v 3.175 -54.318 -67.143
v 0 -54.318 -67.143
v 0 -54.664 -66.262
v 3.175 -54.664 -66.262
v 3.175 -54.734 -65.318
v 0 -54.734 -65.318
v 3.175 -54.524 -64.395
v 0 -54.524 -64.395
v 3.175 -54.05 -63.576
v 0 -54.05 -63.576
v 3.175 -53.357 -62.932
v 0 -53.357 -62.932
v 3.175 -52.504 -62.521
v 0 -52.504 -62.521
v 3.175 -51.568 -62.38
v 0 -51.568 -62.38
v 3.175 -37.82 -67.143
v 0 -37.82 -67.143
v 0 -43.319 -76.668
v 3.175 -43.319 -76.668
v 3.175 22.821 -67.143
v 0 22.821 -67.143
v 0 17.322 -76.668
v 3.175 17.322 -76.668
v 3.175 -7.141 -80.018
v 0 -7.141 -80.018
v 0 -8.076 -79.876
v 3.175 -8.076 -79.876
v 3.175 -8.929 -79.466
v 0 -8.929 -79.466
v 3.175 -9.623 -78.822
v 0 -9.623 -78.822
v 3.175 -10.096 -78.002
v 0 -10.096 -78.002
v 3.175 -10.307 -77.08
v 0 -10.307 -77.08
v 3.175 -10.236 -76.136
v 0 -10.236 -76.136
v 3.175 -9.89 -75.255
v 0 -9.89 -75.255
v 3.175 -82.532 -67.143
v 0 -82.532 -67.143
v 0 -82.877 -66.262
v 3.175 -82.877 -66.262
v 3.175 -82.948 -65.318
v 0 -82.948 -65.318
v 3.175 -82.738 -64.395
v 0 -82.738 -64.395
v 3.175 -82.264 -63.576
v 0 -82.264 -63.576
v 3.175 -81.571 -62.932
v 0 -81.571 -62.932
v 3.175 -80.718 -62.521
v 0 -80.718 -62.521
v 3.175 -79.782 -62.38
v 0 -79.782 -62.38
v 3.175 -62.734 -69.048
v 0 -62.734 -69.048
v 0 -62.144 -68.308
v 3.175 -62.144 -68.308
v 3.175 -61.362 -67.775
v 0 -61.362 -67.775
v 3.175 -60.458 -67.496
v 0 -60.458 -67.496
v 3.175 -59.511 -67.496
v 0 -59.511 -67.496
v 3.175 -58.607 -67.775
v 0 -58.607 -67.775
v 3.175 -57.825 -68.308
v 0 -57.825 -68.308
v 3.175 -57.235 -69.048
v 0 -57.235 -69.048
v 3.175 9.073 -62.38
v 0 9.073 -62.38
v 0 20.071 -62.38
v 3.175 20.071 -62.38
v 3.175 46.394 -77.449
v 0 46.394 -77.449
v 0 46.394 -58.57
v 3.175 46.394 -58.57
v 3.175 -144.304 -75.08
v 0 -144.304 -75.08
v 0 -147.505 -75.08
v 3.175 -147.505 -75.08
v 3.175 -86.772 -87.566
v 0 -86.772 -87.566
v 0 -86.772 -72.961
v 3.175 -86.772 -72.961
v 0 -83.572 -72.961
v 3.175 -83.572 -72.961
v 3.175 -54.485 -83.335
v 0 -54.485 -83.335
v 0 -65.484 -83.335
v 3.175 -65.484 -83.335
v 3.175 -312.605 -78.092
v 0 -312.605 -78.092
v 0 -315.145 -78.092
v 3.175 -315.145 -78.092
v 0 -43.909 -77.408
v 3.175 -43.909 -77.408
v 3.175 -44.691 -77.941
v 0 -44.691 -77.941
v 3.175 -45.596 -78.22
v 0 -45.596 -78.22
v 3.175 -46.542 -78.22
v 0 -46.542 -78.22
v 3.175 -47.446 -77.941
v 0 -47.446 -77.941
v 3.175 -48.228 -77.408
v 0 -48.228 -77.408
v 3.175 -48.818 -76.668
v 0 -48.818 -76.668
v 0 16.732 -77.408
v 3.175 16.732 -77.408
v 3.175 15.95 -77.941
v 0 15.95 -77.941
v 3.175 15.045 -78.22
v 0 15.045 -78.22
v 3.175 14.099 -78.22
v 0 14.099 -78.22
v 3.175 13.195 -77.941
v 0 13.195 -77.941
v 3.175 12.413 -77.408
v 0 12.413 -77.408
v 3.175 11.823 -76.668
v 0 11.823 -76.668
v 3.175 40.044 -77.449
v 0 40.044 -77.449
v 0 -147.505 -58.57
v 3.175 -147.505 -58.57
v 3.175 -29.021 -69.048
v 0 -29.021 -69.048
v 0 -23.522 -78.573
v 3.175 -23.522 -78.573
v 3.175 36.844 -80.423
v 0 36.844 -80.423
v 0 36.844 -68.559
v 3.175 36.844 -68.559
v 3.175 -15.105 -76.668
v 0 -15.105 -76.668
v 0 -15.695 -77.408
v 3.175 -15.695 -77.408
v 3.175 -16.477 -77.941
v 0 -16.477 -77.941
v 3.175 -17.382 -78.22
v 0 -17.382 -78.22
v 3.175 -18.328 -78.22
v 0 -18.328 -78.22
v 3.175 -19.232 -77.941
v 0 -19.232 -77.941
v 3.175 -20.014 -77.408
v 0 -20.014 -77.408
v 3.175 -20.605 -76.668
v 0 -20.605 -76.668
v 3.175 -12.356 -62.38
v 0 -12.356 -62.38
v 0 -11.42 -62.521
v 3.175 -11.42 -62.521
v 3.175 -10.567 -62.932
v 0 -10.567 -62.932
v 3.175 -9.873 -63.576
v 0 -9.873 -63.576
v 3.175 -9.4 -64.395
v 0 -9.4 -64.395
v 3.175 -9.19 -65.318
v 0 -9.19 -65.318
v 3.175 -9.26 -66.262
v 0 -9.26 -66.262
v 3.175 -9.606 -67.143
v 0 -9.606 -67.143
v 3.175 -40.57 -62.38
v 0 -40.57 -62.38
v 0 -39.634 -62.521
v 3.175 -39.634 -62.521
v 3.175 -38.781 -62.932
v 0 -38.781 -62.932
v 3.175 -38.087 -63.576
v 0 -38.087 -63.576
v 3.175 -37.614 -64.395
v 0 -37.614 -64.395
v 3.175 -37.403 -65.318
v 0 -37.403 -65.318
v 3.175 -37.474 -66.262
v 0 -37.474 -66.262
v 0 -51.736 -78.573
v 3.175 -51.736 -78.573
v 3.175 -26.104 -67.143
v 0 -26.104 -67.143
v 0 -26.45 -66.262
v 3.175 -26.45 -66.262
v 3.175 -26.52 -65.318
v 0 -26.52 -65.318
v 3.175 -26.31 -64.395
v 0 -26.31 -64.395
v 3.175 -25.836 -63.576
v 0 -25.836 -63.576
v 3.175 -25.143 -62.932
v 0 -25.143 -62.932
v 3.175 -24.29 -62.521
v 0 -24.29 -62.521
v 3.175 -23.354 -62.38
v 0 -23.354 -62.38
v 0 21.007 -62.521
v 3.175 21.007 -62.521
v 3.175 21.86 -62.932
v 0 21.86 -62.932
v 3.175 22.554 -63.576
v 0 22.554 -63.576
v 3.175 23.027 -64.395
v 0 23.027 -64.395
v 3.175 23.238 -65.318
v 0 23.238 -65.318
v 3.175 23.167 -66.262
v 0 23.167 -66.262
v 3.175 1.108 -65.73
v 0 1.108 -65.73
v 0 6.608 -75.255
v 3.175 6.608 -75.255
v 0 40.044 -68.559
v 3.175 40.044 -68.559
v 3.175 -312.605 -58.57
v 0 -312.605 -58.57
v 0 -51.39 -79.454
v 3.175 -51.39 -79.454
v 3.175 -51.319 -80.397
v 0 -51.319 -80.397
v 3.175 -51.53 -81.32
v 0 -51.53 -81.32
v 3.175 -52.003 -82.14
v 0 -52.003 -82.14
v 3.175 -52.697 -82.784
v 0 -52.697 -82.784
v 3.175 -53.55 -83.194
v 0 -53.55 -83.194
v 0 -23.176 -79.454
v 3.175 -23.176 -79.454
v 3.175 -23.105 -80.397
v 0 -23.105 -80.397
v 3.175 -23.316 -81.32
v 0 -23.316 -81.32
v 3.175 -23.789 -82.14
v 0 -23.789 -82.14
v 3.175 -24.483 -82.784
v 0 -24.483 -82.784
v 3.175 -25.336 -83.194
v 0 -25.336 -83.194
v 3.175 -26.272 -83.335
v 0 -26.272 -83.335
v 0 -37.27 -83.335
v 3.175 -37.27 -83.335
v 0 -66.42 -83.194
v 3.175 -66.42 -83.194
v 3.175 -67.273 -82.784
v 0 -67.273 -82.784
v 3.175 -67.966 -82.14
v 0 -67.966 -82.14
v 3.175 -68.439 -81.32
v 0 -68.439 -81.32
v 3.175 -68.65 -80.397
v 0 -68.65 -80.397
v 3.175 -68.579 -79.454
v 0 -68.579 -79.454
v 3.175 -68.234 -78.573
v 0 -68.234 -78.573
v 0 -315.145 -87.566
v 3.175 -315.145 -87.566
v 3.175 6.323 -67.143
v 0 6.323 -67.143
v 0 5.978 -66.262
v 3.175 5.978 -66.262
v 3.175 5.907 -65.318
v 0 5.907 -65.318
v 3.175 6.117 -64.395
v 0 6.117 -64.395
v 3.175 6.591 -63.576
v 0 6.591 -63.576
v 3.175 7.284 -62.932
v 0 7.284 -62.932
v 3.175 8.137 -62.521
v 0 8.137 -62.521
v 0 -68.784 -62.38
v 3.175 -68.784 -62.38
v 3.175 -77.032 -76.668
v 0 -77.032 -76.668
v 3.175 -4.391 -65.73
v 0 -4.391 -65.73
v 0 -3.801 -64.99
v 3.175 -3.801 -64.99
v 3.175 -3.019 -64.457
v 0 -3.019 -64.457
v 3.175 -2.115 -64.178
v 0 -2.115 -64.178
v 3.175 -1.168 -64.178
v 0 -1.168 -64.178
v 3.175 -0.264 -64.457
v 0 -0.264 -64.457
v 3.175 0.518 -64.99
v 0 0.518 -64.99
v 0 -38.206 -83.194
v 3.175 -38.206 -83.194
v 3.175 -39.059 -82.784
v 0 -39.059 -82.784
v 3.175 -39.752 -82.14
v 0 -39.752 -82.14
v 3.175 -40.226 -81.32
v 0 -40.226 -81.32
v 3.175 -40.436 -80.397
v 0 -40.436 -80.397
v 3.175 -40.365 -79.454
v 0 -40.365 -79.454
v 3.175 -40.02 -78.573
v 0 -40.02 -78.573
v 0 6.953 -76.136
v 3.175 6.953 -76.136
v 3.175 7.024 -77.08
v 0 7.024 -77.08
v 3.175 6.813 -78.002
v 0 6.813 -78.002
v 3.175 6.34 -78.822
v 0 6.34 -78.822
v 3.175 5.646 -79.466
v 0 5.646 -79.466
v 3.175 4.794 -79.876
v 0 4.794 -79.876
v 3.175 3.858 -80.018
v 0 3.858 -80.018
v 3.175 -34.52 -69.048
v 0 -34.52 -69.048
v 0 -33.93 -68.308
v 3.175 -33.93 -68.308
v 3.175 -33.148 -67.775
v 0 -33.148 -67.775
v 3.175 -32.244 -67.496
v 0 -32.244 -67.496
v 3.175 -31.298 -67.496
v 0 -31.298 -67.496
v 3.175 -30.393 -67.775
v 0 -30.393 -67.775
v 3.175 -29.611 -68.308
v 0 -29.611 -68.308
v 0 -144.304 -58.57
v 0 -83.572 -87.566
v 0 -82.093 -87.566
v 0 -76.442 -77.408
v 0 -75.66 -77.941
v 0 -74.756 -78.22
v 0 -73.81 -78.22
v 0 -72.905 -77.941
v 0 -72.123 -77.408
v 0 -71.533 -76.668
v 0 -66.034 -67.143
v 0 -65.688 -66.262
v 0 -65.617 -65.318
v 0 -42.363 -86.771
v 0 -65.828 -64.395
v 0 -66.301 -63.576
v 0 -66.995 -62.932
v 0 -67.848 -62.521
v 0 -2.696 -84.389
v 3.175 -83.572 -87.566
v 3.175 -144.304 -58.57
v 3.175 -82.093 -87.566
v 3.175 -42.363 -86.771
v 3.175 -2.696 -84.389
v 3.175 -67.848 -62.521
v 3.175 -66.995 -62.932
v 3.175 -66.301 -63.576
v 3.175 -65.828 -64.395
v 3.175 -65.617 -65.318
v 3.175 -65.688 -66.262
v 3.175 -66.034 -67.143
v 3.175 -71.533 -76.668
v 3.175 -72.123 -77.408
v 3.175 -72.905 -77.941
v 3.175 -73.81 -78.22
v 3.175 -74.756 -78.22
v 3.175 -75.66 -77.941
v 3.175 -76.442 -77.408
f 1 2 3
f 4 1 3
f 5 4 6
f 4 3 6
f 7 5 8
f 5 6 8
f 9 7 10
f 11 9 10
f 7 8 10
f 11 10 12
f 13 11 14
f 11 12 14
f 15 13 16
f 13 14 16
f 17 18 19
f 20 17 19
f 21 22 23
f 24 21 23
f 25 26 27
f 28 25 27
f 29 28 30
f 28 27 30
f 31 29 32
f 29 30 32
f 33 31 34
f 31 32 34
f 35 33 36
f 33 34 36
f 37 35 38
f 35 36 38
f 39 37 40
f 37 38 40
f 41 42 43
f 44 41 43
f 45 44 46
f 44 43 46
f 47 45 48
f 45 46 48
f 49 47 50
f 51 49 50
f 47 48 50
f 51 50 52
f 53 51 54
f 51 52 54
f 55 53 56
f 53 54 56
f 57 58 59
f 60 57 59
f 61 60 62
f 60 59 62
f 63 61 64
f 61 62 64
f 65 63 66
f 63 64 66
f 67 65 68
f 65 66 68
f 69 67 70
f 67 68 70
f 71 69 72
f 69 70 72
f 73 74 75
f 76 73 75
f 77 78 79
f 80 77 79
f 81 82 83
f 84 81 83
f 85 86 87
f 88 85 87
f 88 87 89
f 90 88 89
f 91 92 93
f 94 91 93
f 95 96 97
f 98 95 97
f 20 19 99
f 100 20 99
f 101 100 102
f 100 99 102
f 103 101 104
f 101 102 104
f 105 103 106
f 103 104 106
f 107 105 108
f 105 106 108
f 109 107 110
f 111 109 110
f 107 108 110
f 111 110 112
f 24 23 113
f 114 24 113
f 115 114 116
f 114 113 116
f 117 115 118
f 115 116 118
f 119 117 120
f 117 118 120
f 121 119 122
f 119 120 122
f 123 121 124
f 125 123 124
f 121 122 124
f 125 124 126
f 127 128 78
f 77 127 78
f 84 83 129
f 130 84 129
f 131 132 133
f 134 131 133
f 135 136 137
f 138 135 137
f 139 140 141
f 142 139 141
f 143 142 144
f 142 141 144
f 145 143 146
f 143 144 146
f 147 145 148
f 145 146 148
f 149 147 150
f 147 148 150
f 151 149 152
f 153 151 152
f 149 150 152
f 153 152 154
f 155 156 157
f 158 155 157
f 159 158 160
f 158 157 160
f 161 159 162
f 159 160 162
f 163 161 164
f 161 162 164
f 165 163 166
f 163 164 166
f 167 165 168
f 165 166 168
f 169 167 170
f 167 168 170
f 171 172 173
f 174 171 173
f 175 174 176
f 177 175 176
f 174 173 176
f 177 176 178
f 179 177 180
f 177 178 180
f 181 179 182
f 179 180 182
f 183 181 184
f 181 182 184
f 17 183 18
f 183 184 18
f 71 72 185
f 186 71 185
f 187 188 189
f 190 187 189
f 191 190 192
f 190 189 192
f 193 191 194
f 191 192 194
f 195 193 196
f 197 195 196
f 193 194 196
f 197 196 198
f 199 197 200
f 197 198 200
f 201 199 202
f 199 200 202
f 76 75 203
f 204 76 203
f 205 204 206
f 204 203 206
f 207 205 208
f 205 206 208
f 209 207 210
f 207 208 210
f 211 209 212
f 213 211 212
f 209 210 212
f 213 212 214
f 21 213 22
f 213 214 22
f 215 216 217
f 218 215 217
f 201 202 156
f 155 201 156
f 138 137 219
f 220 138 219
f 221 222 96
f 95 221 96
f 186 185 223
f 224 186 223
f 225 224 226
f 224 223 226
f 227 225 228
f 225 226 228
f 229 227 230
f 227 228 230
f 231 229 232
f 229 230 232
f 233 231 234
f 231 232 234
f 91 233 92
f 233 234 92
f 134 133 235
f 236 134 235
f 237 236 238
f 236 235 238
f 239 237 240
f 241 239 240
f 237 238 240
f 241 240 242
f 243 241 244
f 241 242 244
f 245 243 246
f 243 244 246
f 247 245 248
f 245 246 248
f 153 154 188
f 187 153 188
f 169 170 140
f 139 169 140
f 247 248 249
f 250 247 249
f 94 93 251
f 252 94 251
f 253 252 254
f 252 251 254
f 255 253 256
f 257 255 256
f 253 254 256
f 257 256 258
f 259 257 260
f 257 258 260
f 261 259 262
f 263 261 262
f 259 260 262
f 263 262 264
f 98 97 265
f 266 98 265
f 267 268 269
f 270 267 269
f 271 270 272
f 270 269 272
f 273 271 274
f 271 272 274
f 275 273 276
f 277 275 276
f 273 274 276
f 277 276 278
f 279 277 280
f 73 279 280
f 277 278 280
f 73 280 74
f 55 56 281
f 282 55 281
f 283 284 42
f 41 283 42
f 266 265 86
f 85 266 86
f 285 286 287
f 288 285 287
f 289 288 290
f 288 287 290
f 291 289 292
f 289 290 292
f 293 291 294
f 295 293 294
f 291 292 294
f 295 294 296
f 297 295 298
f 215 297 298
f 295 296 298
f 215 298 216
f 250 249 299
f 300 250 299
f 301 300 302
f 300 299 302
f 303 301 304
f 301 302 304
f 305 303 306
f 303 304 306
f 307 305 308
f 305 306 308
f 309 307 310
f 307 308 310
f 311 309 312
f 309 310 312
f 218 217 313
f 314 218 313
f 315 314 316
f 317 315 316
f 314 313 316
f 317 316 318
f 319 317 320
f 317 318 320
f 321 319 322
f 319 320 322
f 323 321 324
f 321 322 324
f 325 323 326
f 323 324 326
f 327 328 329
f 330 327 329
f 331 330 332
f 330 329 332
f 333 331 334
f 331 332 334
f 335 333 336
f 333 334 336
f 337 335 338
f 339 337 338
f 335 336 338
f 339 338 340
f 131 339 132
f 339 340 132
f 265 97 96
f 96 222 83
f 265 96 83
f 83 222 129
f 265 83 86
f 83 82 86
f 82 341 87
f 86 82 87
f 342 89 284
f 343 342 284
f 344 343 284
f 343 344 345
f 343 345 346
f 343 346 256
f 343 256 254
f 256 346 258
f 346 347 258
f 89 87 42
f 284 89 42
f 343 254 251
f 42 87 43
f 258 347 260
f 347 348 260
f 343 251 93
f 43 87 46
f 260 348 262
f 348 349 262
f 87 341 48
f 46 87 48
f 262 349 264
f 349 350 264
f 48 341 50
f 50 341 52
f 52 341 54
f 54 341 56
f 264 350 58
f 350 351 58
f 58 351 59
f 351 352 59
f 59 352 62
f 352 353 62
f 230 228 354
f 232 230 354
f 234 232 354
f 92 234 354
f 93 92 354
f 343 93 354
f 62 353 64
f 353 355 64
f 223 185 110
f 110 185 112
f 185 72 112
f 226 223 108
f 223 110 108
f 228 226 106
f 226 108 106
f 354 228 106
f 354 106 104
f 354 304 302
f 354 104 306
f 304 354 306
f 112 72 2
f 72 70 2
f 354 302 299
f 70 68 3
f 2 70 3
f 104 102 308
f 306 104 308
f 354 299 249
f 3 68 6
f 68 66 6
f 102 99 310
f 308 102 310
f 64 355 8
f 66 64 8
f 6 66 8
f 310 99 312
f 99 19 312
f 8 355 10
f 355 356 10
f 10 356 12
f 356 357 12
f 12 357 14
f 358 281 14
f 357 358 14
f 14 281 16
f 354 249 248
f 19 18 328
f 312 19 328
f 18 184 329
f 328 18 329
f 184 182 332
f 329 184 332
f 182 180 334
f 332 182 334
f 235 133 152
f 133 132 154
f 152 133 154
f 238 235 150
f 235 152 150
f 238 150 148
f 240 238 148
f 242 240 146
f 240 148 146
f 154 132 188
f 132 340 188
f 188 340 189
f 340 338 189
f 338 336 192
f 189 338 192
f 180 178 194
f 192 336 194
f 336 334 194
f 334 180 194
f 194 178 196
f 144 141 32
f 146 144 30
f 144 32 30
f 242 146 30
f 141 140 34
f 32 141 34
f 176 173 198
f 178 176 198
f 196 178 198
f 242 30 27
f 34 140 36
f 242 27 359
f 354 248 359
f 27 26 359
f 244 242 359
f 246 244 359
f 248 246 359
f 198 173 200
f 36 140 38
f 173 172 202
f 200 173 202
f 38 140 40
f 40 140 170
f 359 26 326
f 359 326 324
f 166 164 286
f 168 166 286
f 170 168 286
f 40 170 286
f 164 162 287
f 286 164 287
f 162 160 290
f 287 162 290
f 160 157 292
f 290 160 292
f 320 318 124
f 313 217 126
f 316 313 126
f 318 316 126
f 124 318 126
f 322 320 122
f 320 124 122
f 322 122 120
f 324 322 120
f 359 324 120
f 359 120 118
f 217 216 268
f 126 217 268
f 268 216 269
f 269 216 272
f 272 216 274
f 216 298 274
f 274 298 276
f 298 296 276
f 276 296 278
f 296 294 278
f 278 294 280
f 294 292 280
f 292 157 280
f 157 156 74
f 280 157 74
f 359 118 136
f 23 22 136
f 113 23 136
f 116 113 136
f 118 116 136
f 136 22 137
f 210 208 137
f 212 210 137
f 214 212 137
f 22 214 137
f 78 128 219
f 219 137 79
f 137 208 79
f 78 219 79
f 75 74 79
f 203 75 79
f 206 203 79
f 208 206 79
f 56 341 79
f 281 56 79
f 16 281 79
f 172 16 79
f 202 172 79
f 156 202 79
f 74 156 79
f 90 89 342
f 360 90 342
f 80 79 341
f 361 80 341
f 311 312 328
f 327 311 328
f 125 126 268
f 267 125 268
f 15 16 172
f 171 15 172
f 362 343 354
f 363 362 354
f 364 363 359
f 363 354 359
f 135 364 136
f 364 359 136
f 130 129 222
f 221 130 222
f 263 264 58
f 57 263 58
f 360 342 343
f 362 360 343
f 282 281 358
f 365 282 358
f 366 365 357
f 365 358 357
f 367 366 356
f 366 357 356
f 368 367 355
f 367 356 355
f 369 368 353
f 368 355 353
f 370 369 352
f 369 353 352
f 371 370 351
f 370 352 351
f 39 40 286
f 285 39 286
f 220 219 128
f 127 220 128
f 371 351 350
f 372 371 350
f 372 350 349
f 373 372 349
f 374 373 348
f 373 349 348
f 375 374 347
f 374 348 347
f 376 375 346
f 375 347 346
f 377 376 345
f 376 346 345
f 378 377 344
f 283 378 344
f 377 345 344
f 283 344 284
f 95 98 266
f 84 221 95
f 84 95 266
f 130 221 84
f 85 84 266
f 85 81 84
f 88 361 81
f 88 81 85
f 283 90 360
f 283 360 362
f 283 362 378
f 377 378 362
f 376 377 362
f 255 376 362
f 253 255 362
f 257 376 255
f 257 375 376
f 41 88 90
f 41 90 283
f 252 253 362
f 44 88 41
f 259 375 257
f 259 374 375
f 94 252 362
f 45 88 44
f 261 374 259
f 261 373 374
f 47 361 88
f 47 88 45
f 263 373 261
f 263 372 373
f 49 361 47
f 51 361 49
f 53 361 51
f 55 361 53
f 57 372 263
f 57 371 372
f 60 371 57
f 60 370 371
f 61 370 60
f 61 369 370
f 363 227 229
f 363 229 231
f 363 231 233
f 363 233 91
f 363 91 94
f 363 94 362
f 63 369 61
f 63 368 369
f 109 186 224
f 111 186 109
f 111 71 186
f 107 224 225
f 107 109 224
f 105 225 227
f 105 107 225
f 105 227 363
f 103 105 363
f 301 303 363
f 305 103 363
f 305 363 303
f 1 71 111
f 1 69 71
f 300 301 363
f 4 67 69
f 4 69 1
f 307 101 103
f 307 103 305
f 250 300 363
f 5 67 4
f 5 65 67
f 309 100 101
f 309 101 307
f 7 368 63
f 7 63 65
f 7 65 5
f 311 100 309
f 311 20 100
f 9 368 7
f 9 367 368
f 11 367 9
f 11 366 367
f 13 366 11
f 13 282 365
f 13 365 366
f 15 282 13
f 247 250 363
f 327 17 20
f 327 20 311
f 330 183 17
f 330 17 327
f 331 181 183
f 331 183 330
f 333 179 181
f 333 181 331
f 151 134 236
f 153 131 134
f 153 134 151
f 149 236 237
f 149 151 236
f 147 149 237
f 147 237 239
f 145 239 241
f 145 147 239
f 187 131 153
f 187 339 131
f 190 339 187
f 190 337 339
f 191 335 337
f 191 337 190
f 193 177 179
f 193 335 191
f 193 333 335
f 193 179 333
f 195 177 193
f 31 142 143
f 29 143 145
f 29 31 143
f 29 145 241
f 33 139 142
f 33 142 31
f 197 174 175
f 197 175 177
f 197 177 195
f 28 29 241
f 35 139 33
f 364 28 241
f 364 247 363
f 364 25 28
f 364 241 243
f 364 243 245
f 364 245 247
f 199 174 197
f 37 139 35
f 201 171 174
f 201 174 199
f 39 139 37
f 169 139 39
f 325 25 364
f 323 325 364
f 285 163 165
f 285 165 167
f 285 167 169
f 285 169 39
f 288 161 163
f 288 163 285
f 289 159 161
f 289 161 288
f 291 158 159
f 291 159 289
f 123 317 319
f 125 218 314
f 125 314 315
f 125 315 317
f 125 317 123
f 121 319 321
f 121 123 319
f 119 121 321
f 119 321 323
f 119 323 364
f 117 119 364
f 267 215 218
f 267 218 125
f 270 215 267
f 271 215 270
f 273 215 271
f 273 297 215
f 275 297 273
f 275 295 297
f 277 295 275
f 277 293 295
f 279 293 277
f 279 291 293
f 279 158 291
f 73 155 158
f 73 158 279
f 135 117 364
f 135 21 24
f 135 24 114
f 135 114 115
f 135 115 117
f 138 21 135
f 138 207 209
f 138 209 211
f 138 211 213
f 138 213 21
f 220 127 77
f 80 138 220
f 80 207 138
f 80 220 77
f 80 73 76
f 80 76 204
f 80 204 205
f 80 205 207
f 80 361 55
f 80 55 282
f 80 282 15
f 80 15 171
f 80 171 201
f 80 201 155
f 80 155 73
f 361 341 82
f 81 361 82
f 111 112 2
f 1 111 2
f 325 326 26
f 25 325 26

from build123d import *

# Parameters (mm, degrees)
F1_DEPTH = 3.175


with BuildPart() as f1:
    # F0 (on Right) → F1 (new body)
    with BuildSketch(Plane.YZ):
        with BuildLine():
            Line((46.394076, -58.570202), (-144.304461, -58.570202))
            Line((-144.304461, -58.570202), (-144.304461, -75.080202))
            Line((-144.304461, -75.080202), (-147.504861, -75.080202))
            Line((-147.504861, -75.080202), (-147.504861, -58.570202))
            Line((-147.504861, -58.570202), (-312.604861, -58.570202))
            Line((-312.604861, -58.570202), (-312.604861, -78.091796))
            Line((-312.604861, -78.091796), (-315.144861, -78.091796))
            Line((-315.144861, -78.091796), (-315.144861, -87.565996))
            Line((-315.144861, -87.565996), (-86.772296, -87.565996))
            Line((-86.772296, -87.565996), (-86.772296, -72.960996))
            Line((-86.772296, -72.960996), (-83.571896, -72.960996))
            Line((-83.571896, -72.960996), (-83.571896, -87.565996))
            Line((-83.571896, -87.565996), (-82.093418, -87.565996))
            ThreePointArc((-82.093418, -87.565996), (-22.517711, -85.778555), (36.843676, -80.422662))
            Line((36.843676, -80.422662), (36.843676, -68.559073))
            Line((36.843676, -68.559073), (40.044076, -68.559073))
            Line((40.044076, -68.559073), (40.044076, -77.449073))
            Line((40.044076, -77.449073), (46.394076, -77.449073))
            Line((46.394076, -77.449073), (46.394076, -58.570202))
        make_face()
        with BuildLine():
            Line((-54.485447, -83.335202), (-65.48397, -83.335202))
            ThreePointArc((-65.48397, -83.335202), (-68.233601, -81.747702), (-68.233601, -78.572702))
            Line((-68.233601, -78.572702), (-62.734339, -69.047702))
            ThreePointArc((-62.734339, -69.047702), (-59.984709, -67.460202), (-57.235078, -69.047702))
            Line((-57.235078, -69.047702), (-51.735817, -78.572702))
            ThreePointArc((-51.735817, -78.572702), (-51.735817, -81.747702), (-54.485447, -83.335202))
        make_face(mode=Mode.SUBTRACT)
        with BuildLine():
            Line((-40.019661, -78.572702), (-34.520399, -69.047702))
            ThreePointArc((-34.520399, -69.047702), (-31.770769, -67.460202), (-29.021138, -69.047702))
            Line((-29.021138, -69.047702), (-23.521877, -78.572702))
            ThreePointArc((-23.521877, -78.572702), (-23.521877, -81.747702), (-26.271507, -83.335202))
            Line((-26.271507, -83.335202), (-37.27003, -83.335202))
            ThreePointArc((-37.27003, -83.335202), (-40.019661, -81.747702), (-40.019661, -78.572702))
        make_face(mode=Mode.SUBTRACT)
        with BuildLine():
            ThreePointArc((-68.783527, -62.380202), (-66.033896, -63.967702), (-66.033896, -67.142702))
            Line((-66.033896, -67.142702), (-71.533157, -76.667702))
            ThreePointArc((-71.533157, -76.667702), (-74.282788, -78.255202), (-77.032419, -76.667702))
            Line((-77.032419, -76.667702), (-82.53168, -67.142702))
            ThreePointArc((-82.53168, -67.142702), (-82.53168, -63.967702), (-79.782049, -62.380202))
            Line((-79.782049, -62.380202), (-68.783527, -62.380202))
        make_face(mode=Mode.SUBTRACT)
        with BuildLine():
            ThreePointArc((-54.31774, -67.142702), (-54.31774, -63.967702), (-51.568109, -62.380202))
            Line((-51.568109, -62.380202), (-40.569587, -62.380202))
            ThreePointArc((-40.569587, -62.380202), (-37.819956, -63.967702), (-37.819956, -67.142702))
            Line((-37.819956, -67.142702), (-43.319217, -76.667702))
            ThreePointArc((-43.319217, -76.667702), (-46.068848, -78.255202), (-48.818479, -76.667702))
            Line((-48.818479, -76.667702), (-54.31774, -67.142702))
        make_face(mode=Mode.SUBTRACT)
        with BuildLine():
            ThreePointArc((6.607539, -75.255), (6.607539, -78.43), (3.857909, -80.0175))
            Line((3.857909, -80.0175), (-7.140614, -80.0175))
            ThreePointArc((-7.140614, -80.0175), (-9.890245, -78.43), (-9.890245, -75.255))
            Line((-9.890245, -75.255), (-4.390983, -65.73))
            ThreePointArc((-4.390983, -65.73), (-1.641353, -64.1425), (1.108278, -65.73))
            Line((1.108278, -65.73), (6.607539, -75.255))
        make_face(mode=Mode.SUBTRACT)
        with BuildLine():
            ThreePointArc((-26.1038, -67.142702), (-26.1038, -63.967702), (-23.354169, -62.380202))
            Line((-23.354169, -62.380202), (-12.355647, -62.380202))
            ThreePointArc((-12.355647, -62.380202), (-9.606016, -63.967702), (-9.606016, -67.142702))
            Line((-9.606016, -67.142702), (-15.105277, -76.667702))
            ThreePointArc((-15.105277, -76.667702), (-17.854908, -78.255202), (-20.604539, -76.667702))
            Line((-20.604539, -76.667702), (-26.1038, -67.142702))
        make_face(mode=Mode.SUBTRACT)
        with BuildLine():
            ThreePointArc((6.323311, -67.142702), (6.323311, -63.967702), (9.072942, -62.380202))
            Line((9.072942, -62.380202), (20.071464, -62.380202))
            ThreePointArc((20.071464, -62.380202), (22.821095, -63.967702), (22.821095, -67.142702))
            Line((22.821095, -67.142702), (17.321834, -76.667702))
            ThreePointArc((17.321834, -76.667702), (14.572203, -78.255202), (11.822572, -76.667702))
            Line((11.822572, -76.667702), (6.323311, -67.142702))
        make_face(mode=Mode.SUBTRACT)
    extrude(amount=F1_DEPTH)


solid = f1.part
